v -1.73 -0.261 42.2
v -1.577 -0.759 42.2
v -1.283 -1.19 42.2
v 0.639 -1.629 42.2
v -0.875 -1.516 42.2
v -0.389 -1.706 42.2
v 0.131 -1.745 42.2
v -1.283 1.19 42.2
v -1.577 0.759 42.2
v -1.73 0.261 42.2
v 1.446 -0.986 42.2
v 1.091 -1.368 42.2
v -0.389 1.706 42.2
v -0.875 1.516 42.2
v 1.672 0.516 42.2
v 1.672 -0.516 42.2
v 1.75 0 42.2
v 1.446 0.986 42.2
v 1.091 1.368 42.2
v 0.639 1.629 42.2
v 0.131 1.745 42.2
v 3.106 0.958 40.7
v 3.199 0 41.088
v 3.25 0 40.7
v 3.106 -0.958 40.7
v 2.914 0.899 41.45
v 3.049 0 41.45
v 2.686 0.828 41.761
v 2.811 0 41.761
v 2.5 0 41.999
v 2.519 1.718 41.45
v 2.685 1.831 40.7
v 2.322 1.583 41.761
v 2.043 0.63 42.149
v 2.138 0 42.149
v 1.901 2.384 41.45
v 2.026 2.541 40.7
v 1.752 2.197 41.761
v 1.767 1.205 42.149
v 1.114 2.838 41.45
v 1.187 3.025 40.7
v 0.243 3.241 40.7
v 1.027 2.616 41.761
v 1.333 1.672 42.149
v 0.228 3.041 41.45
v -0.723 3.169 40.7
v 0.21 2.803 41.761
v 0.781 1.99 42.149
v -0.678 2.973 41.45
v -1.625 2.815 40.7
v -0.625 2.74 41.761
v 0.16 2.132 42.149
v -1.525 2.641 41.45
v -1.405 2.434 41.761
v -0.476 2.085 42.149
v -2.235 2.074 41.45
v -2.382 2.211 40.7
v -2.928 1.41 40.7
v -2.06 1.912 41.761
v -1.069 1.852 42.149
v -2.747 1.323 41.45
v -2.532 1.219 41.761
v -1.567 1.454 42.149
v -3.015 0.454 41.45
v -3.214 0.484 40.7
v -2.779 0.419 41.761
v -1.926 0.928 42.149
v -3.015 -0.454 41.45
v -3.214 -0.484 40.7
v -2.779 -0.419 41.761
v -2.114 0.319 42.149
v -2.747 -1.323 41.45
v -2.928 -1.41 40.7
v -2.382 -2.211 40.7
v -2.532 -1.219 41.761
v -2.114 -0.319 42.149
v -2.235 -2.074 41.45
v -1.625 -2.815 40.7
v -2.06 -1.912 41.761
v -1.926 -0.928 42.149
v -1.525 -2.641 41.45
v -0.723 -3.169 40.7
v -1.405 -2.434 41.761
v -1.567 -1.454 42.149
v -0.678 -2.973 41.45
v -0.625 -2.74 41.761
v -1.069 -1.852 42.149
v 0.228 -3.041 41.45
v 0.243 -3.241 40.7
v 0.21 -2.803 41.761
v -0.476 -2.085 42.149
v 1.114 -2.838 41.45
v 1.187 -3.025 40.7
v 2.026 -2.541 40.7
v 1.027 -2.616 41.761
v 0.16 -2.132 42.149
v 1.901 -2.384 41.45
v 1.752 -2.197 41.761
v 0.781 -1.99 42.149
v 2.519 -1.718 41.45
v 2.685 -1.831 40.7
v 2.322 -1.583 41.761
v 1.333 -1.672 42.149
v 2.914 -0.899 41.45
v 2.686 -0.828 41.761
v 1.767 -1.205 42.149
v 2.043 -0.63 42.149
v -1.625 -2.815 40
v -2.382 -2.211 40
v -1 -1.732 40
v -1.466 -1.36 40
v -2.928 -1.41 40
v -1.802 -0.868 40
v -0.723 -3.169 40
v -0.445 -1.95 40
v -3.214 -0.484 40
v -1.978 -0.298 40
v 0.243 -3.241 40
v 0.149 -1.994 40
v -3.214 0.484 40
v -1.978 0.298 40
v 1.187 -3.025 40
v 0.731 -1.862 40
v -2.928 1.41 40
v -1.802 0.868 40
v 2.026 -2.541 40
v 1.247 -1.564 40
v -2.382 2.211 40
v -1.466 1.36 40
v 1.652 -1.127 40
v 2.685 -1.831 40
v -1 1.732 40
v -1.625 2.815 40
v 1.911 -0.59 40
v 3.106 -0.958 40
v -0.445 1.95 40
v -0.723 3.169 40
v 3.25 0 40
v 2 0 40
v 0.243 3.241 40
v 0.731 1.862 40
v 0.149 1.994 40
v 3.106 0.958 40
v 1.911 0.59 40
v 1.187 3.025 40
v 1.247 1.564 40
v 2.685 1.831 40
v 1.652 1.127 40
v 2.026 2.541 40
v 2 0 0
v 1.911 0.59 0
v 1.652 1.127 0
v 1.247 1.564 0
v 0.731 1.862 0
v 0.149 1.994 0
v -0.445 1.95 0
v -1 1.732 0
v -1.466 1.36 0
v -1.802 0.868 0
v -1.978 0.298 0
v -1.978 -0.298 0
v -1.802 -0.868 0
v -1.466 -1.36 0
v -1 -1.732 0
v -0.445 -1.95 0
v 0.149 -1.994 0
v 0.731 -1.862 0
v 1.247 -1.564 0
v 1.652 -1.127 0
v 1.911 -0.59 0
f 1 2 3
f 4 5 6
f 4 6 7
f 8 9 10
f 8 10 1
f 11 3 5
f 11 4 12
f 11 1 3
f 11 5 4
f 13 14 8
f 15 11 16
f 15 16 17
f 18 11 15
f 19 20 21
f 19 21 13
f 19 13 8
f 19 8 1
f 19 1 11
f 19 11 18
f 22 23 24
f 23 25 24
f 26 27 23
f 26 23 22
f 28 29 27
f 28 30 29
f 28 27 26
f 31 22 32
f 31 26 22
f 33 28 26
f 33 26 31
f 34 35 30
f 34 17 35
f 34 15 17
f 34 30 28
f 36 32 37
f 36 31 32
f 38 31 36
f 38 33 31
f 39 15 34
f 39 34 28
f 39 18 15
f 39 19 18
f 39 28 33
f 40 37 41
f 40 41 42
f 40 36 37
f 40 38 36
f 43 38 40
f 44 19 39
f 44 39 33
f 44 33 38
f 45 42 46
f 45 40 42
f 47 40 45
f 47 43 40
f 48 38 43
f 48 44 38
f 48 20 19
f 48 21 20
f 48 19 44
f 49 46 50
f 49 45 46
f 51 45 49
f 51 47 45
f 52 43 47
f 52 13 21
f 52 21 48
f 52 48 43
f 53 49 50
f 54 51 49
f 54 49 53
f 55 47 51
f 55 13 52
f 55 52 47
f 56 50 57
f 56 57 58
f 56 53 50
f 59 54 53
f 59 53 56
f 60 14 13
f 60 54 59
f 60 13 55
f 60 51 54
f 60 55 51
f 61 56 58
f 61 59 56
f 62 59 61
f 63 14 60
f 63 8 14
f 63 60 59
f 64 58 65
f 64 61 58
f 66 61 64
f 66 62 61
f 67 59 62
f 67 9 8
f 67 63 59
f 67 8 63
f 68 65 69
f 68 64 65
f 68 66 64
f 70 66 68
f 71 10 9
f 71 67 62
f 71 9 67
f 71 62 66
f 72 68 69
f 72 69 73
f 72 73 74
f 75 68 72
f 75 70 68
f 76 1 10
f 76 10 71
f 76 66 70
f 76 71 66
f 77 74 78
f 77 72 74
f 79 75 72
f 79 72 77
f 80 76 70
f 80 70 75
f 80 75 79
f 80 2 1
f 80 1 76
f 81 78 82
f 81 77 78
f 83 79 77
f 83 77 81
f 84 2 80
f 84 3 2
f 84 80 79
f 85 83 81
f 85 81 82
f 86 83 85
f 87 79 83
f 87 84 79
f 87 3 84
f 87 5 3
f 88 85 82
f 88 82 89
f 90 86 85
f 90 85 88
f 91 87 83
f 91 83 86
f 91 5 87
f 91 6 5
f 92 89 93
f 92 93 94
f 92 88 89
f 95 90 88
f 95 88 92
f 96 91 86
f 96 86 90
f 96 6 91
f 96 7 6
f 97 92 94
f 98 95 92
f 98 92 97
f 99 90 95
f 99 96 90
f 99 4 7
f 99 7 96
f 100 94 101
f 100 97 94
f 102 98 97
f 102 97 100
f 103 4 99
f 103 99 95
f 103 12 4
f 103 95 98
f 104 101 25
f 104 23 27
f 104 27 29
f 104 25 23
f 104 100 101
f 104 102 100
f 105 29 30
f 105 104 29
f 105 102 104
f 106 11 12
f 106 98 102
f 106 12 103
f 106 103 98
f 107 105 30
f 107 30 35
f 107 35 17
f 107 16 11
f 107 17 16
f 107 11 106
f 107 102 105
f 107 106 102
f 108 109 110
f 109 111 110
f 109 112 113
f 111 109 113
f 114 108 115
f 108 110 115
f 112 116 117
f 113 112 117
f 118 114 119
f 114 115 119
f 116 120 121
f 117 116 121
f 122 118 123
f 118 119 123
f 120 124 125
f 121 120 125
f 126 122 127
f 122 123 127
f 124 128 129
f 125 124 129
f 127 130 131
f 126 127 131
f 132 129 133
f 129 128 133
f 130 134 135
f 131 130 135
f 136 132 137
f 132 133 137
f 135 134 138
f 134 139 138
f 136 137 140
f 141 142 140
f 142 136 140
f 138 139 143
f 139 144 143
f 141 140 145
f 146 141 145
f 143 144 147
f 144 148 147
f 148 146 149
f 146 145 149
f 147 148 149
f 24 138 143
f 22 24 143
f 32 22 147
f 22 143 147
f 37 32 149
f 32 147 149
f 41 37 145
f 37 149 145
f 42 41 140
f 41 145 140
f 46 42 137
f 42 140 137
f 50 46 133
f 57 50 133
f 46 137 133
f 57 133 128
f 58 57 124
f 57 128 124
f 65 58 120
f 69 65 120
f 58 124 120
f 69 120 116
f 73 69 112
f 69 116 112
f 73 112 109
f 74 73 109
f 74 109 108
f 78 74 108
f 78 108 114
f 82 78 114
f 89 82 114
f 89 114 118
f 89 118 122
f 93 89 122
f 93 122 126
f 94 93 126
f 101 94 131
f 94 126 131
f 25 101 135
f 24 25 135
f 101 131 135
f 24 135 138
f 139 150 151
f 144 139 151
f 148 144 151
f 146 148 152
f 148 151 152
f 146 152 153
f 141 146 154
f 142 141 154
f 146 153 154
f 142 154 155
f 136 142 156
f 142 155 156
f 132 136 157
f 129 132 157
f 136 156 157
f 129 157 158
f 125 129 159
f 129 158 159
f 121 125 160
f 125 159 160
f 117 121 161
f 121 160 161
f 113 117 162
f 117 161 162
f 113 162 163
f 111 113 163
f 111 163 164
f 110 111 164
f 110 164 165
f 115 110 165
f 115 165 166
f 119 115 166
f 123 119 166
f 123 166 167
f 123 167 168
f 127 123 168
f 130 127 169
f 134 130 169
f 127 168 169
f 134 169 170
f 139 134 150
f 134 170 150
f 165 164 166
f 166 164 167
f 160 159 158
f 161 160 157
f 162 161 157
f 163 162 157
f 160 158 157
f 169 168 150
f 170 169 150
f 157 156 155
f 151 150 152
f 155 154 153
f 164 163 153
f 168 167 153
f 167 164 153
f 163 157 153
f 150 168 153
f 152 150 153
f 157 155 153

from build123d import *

# Parameters (mm, degrees)
SKETCH_1_R      = 2
EXTRUDE_1_DEPTH = 40
SKETCH_2_R      = 3.25
EXTRUDE_2_DEPTH = 2.2
FILLET_1_R      = 1.5


with BuildPart() as part:
    # 草图1 → 凸台-拉伸1 (new body)
    with BuildSketch(Plane.XY):
        Circle(SKETCH_1_R)
    extrude(amount=EXTRUDE_1_DEPTH)

    # 草图2 → 凸台-拉伸2 (add)
    with BuildSketch(Plane.XY.offset(40)):
        Circle(SKETCH_2_R)
    extrude(amount=EXTRUDE_2_DEPTH)

    # 圆角1
    fillet_1_edges = [part.edges().sort_by_distance(p)[0] for p in [
        (-3.25, 0, 42.2),
    ]]
    fillet(fillet_1_edges, radius=FILLET_1_R)


solid = part.part
